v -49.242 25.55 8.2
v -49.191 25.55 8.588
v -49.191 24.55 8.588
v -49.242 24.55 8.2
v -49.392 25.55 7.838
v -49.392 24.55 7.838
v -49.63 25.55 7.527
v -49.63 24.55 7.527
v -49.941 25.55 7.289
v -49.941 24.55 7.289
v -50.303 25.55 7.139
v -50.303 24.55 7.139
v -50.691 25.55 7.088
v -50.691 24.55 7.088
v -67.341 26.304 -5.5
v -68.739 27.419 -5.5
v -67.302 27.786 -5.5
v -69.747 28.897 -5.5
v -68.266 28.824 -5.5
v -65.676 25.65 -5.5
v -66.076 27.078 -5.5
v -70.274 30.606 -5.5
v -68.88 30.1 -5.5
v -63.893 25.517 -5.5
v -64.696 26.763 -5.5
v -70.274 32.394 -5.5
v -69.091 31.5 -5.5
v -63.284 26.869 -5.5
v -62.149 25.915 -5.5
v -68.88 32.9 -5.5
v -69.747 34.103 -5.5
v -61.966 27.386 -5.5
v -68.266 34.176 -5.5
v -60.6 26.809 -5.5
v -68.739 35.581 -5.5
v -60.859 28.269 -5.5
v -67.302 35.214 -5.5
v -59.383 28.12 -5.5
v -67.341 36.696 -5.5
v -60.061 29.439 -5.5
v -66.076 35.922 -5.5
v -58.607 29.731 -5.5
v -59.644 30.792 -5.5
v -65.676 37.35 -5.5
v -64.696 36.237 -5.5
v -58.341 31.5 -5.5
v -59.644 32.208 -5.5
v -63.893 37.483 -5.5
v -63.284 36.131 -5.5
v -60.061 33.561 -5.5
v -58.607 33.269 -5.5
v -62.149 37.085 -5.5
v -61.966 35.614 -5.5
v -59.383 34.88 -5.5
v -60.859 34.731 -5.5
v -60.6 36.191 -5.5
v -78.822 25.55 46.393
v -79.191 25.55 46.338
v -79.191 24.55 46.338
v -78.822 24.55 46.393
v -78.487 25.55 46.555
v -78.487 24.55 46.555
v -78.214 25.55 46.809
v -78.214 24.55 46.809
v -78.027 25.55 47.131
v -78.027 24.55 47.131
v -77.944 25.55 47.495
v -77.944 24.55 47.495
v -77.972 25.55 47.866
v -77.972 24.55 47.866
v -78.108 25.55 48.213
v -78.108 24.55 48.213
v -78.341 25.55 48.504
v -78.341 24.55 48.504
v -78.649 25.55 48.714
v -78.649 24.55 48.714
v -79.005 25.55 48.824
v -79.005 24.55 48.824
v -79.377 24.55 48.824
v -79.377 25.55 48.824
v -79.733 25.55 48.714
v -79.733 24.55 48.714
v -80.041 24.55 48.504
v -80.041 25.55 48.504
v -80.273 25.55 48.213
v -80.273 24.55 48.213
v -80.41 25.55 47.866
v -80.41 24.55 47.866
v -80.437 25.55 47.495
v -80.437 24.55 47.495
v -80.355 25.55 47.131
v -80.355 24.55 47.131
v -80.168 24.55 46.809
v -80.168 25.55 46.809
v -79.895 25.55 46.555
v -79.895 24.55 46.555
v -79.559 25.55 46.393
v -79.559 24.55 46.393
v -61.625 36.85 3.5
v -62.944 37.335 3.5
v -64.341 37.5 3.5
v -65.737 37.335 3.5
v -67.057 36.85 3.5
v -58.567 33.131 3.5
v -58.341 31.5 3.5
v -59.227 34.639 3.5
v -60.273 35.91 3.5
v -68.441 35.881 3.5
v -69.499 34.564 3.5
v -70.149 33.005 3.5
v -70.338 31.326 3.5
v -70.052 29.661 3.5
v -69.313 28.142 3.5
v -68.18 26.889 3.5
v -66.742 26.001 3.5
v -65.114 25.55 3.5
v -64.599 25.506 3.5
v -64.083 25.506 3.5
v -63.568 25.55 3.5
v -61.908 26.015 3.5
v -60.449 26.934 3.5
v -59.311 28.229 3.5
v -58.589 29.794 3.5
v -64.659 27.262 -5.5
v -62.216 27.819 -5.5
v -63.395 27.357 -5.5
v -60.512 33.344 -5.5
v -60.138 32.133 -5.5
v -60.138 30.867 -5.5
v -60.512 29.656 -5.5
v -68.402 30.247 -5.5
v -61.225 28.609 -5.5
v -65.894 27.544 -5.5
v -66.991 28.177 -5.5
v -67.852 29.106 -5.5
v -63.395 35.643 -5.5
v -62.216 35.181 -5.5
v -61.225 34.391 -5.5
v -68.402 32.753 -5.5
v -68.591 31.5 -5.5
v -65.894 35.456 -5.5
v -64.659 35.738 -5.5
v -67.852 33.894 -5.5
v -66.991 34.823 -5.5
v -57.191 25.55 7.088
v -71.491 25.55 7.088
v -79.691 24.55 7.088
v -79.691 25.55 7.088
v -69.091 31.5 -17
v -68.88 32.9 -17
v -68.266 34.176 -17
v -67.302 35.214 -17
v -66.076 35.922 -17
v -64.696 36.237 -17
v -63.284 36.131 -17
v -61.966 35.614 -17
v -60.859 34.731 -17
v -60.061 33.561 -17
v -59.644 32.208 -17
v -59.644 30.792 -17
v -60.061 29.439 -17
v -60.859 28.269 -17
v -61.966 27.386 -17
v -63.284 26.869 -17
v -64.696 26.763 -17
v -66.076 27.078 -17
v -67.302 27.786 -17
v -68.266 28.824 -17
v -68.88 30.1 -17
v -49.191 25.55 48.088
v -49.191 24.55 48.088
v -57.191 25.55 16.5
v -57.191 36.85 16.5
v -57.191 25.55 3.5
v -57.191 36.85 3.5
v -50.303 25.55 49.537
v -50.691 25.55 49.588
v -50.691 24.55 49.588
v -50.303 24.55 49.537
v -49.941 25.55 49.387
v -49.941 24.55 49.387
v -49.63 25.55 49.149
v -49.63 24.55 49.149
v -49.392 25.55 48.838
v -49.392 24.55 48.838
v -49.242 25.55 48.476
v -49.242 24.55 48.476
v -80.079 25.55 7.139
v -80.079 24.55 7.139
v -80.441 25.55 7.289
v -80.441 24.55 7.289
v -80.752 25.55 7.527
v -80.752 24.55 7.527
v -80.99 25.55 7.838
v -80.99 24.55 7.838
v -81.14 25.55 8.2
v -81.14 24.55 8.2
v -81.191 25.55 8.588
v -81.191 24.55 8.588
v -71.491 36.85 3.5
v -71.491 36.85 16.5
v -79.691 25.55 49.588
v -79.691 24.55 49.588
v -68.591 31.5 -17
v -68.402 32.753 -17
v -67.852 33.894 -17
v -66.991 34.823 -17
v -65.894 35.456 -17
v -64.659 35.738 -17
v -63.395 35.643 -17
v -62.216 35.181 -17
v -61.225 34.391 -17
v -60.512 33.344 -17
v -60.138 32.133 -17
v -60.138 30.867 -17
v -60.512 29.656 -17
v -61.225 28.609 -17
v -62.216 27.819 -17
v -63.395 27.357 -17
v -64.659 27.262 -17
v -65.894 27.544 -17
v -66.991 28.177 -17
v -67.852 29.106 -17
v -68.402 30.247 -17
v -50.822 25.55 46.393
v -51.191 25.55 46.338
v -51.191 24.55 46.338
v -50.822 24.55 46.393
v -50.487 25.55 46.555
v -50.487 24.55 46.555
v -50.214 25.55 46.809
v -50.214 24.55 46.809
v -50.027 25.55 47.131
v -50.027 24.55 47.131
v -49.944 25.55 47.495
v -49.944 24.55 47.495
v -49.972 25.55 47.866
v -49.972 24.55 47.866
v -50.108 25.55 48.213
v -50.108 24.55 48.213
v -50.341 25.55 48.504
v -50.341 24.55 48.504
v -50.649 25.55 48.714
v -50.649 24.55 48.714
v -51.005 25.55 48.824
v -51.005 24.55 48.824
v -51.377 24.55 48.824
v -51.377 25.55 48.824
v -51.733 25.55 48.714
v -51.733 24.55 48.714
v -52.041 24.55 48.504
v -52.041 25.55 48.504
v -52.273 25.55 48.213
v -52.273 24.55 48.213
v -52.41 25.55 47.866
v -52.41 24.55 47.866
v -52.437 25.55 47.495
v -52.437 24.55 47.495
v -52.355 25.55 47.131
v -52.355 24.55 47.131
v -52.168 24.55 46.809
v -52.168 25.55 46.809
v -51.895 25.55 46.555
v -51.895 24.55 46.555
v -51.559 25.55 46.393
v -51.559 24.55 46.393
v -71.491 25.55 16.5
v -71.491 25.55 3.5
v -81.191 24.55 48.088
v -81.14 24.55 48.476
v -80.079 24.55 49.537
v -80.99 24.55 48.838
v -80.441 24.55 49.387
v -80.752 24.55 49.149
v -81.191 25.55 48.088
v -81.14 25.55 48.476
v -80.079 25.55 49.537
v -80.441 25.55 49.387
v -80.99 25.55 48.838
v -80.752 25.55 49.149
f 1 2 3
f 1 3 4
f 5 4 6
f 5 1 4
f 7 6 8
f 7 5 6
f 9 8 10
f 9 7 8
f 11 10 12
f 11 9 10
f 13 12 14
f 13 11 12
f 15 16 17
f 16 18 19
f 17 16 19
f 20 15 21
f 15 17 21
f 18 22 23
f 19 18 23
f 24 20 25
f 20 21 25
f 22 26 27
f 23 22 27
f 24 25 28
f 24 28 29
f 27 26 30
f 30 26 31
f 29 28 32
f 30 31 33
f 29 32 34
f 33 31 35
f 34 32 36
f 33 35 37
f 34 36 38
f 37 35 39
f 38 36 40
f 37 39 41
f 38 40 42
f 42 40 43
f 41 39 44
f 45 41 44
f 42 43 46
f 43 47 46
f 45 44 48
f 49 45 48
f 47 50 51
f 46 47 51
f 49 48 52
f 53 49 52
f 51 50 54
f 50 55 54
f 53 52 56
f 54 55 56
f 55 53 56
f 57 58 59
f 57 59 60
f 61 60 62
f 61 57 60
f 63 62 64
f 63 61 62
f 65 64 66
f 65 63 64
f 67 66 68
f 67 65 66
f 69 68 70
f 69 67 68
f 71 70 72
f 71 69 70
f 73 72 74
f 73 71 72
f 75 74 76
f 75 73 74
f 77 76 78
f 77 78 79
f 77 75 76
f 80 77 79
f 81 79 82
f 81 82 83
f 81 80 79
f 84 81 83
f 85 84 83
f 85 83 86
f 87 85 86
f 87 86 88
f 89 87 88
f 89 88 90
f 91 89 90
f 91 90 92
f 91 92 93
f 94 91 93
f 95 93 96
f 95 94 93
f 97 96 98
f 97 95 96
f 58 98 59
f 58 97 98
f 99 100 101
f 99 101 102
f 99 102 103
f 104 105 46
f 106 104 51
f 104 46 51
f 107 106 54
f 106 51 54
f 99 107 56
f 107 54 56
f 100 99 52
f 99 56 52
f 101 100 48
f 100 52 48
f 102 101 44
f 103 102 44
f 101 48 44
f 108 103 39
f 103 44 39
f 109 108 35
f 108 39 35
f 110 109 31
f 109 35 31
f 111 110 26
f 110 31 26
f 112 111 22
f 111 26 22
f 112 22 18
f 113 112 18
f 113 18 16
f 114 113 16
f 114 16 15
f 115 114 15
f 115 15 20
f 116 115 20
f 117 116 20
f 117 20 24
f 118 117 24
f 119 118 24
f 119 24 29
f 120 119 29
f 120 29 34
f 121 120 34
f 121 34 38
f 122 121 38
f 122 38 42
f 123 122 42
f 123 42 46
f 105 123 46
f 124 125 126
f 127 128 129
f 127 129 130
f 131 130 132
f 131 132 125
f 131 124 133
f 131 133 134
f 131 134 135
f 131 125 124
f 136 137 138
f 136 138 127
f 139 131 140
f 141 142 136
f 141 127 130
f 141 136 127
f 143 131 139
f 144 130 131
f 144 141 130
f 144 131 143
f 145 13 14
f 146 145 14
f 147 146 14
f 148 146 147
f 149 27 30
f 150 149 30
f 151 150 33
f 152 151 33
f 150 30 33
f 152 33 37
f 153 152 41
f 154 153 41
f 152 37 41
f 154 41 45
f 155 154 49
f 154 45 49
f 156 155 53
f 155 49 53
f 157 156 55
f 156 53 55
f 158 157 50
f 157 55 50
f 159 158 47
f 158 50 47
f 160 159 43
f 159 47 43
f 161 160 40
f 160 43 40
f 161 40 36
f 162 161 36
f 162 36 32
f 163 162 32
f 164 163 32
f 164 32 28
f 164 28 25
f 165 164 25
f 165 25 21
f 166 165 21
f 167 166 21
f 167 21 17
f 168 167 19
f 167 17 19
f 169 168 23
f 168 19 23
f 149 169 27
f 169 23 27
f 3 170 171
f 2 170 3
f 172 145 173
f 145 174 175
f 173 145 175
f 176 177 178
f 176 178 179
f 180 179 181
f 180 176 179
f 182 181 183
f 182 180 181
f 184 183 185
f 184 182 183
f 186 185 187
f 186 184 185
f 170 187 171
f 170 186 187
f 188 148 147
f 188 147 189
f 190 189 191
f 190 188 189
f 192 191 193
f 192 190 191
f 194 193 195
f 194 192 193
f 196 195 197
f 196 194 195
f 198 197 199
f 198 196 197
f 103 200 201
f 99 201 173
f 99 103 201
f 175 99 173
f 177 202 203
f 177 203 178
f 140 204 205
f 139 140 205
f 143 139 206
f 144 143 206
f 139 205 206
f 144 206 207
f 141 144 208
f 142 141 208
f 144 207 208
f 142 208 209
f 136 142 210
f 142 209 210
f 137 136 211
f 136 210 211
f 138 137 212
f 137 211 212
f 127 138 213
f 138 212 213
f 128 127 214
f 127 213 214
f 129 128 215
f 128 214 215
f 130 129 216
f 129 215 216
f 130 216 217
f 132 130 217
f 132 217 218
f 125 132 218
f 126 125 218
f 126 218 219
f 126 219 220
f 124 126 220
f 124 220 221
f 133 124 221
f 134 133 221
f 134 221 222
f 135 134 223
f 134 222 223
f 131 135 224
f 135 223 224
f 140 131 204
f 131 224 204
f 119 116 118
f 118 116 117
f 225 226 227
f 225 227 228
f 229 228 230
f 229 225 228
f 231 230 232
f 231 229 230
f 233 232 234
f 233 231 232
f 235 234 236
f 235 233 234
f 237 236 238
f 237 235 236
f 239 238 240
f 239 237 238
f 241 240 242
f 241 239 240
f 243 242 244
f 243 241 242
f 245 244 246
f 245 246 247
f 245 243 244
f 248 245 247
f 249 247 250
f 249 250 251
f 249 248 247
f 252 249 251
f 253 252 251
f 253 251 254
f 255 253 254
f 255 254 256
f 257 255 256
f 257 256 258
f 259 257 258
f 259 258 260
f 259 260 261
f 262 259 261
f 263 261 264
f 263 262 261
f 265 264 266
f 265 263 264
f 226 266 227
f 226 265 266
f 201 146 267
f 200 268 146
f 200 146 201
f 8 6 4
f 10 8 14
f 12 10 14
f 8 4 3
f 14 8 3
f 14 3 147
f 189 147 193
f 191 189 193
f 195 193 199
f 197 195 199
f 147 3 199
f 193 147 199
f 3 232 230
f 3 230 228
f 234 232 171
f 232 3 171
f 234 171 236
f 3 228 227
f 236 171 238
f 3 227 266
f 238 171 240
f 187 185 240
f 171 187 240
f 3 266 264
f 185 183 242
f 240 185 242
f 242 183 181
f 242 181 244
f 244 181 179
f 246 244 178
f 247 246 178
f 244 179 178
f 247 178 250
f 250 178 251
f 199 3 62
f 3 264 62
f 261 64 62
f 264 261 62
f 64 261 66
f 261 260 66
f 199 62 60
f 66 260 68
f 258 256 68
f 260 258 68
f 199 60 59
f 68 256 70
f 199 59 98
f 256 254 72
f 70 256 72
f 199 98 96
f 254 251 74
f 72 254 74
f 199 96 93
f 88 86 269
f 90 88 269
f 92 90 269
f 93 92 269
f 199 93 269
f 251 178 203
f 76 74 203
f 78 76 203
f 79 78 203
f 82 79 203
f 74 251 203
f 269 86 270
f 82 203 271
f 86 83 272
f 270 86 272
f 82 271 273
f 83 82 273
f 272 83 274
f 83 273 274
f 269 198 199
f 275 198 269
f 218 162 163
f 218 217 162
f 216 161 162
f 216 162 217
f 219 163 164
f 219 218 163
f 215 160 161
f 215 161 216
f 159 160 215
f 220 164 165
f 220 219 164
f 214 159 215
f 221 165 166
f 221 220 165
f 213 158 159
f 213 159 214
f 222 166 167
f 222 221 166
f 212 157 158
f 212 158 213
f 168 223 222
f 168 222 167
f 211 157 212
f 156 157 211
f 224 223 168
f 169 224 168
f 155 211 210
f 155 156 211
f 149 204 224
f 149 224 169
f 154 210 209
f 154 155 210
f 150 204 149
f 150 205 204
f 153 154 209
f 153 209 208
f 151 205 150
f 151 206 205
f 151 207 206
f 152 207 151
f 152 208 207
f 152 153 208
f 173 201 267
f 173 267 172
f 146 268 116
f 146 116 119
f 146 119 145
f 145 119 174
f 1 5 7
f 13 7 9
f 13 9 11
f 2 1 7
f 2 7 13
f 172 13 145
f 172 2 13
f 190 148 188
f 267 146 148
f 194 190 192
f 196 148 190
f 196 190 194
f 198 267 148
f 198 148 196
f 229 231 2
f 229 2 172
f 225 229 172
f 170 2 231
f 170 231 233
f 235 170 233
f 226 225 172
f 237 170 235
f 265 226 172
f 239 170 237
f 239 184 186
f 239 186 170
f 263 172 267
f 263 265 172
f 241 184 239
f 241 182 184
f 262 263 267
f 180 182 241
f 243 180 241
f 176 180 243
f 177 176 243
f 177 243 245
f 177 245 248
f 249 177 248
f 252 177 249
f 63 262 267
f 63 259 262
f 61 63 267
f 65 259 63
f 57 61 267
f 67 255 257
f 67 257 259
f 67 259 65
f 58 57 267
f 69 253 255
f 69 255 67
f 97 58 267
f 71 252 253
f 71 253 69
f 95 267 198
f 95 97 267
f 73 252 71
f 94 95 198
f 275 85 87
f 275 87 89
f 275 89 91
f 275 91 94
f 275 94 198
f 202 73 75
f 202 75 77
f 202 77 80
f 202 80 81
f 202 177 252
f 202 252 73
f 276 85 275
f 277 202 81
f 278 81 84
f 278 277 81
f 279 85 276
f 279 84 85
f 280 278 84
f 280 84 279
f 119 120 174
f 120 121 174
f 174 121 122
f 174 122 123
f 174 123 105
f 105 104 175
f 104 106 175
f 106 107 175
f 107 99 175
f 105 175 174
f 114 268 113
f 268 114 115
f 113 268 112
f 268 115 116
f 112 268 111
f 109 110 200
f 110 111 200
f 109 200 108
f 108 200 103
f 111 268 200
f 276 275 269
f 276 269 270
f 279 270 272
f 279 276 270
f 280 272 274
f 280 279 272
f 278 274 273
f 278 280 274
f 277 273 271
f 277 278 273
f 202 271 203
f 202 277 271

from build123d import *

# Parameters (mm, degrees)
EXTRUDE_1_DEPTH      = 3.5
EXTRUDE_1_DEPTH_BACK = 5.5
SKETCH_1_R           = 6
SKETCH_2_W           = 14.3
SKETCH_2_H           = 11.3
EXTRUDE_2_DEPTH      = 13
SKETCH_3_R           = 1.25
EXTRUDE_3_DEPTH      = 1
SKETCH_4_R           = 4.75
EXTRUDE_4_DEPTH      = 11.5
SKETCH_5_R           = 4.25
CUT_EXTRUDE_1_DEPTH  = 11.5


with BuildPart() as part:
    # 草圖1 → 填料-伸長1 (new, two sides: drawn at the far end of the back side and taken through both)
    with BuildSketch(Plane.XY.offset(-EXTRUDE_1_DEPTH_BACK)):
        with Locations((-64.340909091, 31.5)):
            Circle(SKETCH_1_R)
    extrude(amount=EXTRUDE_1_DEPTH + EXTRUDE_1_DEPTH_BACK)

    # 草圖2 → 填料-伸長2 (add)
    with BuildSketch(Plane.XY.offset(3.5)):
        with Locations((-64.340909091, 31.2)):
            Rectangle(SKETCH_2_W, SKETCH_2_H)
    extrude(amount=EXTRUDE_2_DEPTH)

    # 草圖3 → 填料-伸長3 (add)
    with BuildSketch(Plane.XZ.offset(-25.55)):
        with BuildLine():
            Line((-50.690909091, 7.087920564), (-79.690909091, 7.087920564))
            ThreePointArc((-79.690909091, 7.087920564), (-80.751569263, 7.527260393), (-81.190909091, 8.587920564))
            Line((-81.190909091, 8.587920564), (-81.190909091, 48.087920564))
            ThreePointArc((-81.190909091, 48.087920564), (-80.751569263, 49.148580736), (-79.690909091, 49.587920564))
            Line((-79.690909091, 49.587920564), (-50.690909091, 49.587920564))
            ThreePointArc((-50.690909091, 49.587920564), (-49.630248919, 49.148580736), (-49.190909091, 48.087920564))
            Line((-49.190909091, 48.087920564), (-49.190909091, 8.587920564))
            ThreePointArc((-49.190909091, 8.587920564), (-49.630248919, 7.527260393), (-50.690909091, 7.087920564))
        make_face()
        with Locations(Location((-51.190909091, 47.587920564, 0), (0, 0, 270))):
            Circle(SKETCH_3_R, mode=Mode.SUBTRACT)
        with Locations(Location((-79.190909091, 47.587920564, 0), (0, 0, 270))):
            Circle(SKETCH_3_R, mode=Mode.SUBTRACT)
    extrude(amount=EXTRUDE_3_DEPTH)

    # 草圖4 → 填料-伸長4 (add)
    with BuildSketch(Plane(origin=(0, 0, -5.5), x_dir=(-1, 0, 0), z_dir=(0, 0, -1))):
        with Locations((64.340909091, 31.5)):
            Circle(SKETCH_4_R)
    extrude(amount=EXTRUDE_4_DEPTH)

    # 草圖5 → 除料-伸長1 (cut)
    with BuildSketch(Plane(origin=(0, 0, -17), x_dir=(-1, 0, 0), z_dir=(0, 0, -1))):
        with Locations((64.340909091, 31.5)):
            Circle(SKETCH_5_R)
    extrude(amount=-CUT_EXTRUDE_1_DEPTH, mode=Mode.SUBTRACT)


solid = part.part
